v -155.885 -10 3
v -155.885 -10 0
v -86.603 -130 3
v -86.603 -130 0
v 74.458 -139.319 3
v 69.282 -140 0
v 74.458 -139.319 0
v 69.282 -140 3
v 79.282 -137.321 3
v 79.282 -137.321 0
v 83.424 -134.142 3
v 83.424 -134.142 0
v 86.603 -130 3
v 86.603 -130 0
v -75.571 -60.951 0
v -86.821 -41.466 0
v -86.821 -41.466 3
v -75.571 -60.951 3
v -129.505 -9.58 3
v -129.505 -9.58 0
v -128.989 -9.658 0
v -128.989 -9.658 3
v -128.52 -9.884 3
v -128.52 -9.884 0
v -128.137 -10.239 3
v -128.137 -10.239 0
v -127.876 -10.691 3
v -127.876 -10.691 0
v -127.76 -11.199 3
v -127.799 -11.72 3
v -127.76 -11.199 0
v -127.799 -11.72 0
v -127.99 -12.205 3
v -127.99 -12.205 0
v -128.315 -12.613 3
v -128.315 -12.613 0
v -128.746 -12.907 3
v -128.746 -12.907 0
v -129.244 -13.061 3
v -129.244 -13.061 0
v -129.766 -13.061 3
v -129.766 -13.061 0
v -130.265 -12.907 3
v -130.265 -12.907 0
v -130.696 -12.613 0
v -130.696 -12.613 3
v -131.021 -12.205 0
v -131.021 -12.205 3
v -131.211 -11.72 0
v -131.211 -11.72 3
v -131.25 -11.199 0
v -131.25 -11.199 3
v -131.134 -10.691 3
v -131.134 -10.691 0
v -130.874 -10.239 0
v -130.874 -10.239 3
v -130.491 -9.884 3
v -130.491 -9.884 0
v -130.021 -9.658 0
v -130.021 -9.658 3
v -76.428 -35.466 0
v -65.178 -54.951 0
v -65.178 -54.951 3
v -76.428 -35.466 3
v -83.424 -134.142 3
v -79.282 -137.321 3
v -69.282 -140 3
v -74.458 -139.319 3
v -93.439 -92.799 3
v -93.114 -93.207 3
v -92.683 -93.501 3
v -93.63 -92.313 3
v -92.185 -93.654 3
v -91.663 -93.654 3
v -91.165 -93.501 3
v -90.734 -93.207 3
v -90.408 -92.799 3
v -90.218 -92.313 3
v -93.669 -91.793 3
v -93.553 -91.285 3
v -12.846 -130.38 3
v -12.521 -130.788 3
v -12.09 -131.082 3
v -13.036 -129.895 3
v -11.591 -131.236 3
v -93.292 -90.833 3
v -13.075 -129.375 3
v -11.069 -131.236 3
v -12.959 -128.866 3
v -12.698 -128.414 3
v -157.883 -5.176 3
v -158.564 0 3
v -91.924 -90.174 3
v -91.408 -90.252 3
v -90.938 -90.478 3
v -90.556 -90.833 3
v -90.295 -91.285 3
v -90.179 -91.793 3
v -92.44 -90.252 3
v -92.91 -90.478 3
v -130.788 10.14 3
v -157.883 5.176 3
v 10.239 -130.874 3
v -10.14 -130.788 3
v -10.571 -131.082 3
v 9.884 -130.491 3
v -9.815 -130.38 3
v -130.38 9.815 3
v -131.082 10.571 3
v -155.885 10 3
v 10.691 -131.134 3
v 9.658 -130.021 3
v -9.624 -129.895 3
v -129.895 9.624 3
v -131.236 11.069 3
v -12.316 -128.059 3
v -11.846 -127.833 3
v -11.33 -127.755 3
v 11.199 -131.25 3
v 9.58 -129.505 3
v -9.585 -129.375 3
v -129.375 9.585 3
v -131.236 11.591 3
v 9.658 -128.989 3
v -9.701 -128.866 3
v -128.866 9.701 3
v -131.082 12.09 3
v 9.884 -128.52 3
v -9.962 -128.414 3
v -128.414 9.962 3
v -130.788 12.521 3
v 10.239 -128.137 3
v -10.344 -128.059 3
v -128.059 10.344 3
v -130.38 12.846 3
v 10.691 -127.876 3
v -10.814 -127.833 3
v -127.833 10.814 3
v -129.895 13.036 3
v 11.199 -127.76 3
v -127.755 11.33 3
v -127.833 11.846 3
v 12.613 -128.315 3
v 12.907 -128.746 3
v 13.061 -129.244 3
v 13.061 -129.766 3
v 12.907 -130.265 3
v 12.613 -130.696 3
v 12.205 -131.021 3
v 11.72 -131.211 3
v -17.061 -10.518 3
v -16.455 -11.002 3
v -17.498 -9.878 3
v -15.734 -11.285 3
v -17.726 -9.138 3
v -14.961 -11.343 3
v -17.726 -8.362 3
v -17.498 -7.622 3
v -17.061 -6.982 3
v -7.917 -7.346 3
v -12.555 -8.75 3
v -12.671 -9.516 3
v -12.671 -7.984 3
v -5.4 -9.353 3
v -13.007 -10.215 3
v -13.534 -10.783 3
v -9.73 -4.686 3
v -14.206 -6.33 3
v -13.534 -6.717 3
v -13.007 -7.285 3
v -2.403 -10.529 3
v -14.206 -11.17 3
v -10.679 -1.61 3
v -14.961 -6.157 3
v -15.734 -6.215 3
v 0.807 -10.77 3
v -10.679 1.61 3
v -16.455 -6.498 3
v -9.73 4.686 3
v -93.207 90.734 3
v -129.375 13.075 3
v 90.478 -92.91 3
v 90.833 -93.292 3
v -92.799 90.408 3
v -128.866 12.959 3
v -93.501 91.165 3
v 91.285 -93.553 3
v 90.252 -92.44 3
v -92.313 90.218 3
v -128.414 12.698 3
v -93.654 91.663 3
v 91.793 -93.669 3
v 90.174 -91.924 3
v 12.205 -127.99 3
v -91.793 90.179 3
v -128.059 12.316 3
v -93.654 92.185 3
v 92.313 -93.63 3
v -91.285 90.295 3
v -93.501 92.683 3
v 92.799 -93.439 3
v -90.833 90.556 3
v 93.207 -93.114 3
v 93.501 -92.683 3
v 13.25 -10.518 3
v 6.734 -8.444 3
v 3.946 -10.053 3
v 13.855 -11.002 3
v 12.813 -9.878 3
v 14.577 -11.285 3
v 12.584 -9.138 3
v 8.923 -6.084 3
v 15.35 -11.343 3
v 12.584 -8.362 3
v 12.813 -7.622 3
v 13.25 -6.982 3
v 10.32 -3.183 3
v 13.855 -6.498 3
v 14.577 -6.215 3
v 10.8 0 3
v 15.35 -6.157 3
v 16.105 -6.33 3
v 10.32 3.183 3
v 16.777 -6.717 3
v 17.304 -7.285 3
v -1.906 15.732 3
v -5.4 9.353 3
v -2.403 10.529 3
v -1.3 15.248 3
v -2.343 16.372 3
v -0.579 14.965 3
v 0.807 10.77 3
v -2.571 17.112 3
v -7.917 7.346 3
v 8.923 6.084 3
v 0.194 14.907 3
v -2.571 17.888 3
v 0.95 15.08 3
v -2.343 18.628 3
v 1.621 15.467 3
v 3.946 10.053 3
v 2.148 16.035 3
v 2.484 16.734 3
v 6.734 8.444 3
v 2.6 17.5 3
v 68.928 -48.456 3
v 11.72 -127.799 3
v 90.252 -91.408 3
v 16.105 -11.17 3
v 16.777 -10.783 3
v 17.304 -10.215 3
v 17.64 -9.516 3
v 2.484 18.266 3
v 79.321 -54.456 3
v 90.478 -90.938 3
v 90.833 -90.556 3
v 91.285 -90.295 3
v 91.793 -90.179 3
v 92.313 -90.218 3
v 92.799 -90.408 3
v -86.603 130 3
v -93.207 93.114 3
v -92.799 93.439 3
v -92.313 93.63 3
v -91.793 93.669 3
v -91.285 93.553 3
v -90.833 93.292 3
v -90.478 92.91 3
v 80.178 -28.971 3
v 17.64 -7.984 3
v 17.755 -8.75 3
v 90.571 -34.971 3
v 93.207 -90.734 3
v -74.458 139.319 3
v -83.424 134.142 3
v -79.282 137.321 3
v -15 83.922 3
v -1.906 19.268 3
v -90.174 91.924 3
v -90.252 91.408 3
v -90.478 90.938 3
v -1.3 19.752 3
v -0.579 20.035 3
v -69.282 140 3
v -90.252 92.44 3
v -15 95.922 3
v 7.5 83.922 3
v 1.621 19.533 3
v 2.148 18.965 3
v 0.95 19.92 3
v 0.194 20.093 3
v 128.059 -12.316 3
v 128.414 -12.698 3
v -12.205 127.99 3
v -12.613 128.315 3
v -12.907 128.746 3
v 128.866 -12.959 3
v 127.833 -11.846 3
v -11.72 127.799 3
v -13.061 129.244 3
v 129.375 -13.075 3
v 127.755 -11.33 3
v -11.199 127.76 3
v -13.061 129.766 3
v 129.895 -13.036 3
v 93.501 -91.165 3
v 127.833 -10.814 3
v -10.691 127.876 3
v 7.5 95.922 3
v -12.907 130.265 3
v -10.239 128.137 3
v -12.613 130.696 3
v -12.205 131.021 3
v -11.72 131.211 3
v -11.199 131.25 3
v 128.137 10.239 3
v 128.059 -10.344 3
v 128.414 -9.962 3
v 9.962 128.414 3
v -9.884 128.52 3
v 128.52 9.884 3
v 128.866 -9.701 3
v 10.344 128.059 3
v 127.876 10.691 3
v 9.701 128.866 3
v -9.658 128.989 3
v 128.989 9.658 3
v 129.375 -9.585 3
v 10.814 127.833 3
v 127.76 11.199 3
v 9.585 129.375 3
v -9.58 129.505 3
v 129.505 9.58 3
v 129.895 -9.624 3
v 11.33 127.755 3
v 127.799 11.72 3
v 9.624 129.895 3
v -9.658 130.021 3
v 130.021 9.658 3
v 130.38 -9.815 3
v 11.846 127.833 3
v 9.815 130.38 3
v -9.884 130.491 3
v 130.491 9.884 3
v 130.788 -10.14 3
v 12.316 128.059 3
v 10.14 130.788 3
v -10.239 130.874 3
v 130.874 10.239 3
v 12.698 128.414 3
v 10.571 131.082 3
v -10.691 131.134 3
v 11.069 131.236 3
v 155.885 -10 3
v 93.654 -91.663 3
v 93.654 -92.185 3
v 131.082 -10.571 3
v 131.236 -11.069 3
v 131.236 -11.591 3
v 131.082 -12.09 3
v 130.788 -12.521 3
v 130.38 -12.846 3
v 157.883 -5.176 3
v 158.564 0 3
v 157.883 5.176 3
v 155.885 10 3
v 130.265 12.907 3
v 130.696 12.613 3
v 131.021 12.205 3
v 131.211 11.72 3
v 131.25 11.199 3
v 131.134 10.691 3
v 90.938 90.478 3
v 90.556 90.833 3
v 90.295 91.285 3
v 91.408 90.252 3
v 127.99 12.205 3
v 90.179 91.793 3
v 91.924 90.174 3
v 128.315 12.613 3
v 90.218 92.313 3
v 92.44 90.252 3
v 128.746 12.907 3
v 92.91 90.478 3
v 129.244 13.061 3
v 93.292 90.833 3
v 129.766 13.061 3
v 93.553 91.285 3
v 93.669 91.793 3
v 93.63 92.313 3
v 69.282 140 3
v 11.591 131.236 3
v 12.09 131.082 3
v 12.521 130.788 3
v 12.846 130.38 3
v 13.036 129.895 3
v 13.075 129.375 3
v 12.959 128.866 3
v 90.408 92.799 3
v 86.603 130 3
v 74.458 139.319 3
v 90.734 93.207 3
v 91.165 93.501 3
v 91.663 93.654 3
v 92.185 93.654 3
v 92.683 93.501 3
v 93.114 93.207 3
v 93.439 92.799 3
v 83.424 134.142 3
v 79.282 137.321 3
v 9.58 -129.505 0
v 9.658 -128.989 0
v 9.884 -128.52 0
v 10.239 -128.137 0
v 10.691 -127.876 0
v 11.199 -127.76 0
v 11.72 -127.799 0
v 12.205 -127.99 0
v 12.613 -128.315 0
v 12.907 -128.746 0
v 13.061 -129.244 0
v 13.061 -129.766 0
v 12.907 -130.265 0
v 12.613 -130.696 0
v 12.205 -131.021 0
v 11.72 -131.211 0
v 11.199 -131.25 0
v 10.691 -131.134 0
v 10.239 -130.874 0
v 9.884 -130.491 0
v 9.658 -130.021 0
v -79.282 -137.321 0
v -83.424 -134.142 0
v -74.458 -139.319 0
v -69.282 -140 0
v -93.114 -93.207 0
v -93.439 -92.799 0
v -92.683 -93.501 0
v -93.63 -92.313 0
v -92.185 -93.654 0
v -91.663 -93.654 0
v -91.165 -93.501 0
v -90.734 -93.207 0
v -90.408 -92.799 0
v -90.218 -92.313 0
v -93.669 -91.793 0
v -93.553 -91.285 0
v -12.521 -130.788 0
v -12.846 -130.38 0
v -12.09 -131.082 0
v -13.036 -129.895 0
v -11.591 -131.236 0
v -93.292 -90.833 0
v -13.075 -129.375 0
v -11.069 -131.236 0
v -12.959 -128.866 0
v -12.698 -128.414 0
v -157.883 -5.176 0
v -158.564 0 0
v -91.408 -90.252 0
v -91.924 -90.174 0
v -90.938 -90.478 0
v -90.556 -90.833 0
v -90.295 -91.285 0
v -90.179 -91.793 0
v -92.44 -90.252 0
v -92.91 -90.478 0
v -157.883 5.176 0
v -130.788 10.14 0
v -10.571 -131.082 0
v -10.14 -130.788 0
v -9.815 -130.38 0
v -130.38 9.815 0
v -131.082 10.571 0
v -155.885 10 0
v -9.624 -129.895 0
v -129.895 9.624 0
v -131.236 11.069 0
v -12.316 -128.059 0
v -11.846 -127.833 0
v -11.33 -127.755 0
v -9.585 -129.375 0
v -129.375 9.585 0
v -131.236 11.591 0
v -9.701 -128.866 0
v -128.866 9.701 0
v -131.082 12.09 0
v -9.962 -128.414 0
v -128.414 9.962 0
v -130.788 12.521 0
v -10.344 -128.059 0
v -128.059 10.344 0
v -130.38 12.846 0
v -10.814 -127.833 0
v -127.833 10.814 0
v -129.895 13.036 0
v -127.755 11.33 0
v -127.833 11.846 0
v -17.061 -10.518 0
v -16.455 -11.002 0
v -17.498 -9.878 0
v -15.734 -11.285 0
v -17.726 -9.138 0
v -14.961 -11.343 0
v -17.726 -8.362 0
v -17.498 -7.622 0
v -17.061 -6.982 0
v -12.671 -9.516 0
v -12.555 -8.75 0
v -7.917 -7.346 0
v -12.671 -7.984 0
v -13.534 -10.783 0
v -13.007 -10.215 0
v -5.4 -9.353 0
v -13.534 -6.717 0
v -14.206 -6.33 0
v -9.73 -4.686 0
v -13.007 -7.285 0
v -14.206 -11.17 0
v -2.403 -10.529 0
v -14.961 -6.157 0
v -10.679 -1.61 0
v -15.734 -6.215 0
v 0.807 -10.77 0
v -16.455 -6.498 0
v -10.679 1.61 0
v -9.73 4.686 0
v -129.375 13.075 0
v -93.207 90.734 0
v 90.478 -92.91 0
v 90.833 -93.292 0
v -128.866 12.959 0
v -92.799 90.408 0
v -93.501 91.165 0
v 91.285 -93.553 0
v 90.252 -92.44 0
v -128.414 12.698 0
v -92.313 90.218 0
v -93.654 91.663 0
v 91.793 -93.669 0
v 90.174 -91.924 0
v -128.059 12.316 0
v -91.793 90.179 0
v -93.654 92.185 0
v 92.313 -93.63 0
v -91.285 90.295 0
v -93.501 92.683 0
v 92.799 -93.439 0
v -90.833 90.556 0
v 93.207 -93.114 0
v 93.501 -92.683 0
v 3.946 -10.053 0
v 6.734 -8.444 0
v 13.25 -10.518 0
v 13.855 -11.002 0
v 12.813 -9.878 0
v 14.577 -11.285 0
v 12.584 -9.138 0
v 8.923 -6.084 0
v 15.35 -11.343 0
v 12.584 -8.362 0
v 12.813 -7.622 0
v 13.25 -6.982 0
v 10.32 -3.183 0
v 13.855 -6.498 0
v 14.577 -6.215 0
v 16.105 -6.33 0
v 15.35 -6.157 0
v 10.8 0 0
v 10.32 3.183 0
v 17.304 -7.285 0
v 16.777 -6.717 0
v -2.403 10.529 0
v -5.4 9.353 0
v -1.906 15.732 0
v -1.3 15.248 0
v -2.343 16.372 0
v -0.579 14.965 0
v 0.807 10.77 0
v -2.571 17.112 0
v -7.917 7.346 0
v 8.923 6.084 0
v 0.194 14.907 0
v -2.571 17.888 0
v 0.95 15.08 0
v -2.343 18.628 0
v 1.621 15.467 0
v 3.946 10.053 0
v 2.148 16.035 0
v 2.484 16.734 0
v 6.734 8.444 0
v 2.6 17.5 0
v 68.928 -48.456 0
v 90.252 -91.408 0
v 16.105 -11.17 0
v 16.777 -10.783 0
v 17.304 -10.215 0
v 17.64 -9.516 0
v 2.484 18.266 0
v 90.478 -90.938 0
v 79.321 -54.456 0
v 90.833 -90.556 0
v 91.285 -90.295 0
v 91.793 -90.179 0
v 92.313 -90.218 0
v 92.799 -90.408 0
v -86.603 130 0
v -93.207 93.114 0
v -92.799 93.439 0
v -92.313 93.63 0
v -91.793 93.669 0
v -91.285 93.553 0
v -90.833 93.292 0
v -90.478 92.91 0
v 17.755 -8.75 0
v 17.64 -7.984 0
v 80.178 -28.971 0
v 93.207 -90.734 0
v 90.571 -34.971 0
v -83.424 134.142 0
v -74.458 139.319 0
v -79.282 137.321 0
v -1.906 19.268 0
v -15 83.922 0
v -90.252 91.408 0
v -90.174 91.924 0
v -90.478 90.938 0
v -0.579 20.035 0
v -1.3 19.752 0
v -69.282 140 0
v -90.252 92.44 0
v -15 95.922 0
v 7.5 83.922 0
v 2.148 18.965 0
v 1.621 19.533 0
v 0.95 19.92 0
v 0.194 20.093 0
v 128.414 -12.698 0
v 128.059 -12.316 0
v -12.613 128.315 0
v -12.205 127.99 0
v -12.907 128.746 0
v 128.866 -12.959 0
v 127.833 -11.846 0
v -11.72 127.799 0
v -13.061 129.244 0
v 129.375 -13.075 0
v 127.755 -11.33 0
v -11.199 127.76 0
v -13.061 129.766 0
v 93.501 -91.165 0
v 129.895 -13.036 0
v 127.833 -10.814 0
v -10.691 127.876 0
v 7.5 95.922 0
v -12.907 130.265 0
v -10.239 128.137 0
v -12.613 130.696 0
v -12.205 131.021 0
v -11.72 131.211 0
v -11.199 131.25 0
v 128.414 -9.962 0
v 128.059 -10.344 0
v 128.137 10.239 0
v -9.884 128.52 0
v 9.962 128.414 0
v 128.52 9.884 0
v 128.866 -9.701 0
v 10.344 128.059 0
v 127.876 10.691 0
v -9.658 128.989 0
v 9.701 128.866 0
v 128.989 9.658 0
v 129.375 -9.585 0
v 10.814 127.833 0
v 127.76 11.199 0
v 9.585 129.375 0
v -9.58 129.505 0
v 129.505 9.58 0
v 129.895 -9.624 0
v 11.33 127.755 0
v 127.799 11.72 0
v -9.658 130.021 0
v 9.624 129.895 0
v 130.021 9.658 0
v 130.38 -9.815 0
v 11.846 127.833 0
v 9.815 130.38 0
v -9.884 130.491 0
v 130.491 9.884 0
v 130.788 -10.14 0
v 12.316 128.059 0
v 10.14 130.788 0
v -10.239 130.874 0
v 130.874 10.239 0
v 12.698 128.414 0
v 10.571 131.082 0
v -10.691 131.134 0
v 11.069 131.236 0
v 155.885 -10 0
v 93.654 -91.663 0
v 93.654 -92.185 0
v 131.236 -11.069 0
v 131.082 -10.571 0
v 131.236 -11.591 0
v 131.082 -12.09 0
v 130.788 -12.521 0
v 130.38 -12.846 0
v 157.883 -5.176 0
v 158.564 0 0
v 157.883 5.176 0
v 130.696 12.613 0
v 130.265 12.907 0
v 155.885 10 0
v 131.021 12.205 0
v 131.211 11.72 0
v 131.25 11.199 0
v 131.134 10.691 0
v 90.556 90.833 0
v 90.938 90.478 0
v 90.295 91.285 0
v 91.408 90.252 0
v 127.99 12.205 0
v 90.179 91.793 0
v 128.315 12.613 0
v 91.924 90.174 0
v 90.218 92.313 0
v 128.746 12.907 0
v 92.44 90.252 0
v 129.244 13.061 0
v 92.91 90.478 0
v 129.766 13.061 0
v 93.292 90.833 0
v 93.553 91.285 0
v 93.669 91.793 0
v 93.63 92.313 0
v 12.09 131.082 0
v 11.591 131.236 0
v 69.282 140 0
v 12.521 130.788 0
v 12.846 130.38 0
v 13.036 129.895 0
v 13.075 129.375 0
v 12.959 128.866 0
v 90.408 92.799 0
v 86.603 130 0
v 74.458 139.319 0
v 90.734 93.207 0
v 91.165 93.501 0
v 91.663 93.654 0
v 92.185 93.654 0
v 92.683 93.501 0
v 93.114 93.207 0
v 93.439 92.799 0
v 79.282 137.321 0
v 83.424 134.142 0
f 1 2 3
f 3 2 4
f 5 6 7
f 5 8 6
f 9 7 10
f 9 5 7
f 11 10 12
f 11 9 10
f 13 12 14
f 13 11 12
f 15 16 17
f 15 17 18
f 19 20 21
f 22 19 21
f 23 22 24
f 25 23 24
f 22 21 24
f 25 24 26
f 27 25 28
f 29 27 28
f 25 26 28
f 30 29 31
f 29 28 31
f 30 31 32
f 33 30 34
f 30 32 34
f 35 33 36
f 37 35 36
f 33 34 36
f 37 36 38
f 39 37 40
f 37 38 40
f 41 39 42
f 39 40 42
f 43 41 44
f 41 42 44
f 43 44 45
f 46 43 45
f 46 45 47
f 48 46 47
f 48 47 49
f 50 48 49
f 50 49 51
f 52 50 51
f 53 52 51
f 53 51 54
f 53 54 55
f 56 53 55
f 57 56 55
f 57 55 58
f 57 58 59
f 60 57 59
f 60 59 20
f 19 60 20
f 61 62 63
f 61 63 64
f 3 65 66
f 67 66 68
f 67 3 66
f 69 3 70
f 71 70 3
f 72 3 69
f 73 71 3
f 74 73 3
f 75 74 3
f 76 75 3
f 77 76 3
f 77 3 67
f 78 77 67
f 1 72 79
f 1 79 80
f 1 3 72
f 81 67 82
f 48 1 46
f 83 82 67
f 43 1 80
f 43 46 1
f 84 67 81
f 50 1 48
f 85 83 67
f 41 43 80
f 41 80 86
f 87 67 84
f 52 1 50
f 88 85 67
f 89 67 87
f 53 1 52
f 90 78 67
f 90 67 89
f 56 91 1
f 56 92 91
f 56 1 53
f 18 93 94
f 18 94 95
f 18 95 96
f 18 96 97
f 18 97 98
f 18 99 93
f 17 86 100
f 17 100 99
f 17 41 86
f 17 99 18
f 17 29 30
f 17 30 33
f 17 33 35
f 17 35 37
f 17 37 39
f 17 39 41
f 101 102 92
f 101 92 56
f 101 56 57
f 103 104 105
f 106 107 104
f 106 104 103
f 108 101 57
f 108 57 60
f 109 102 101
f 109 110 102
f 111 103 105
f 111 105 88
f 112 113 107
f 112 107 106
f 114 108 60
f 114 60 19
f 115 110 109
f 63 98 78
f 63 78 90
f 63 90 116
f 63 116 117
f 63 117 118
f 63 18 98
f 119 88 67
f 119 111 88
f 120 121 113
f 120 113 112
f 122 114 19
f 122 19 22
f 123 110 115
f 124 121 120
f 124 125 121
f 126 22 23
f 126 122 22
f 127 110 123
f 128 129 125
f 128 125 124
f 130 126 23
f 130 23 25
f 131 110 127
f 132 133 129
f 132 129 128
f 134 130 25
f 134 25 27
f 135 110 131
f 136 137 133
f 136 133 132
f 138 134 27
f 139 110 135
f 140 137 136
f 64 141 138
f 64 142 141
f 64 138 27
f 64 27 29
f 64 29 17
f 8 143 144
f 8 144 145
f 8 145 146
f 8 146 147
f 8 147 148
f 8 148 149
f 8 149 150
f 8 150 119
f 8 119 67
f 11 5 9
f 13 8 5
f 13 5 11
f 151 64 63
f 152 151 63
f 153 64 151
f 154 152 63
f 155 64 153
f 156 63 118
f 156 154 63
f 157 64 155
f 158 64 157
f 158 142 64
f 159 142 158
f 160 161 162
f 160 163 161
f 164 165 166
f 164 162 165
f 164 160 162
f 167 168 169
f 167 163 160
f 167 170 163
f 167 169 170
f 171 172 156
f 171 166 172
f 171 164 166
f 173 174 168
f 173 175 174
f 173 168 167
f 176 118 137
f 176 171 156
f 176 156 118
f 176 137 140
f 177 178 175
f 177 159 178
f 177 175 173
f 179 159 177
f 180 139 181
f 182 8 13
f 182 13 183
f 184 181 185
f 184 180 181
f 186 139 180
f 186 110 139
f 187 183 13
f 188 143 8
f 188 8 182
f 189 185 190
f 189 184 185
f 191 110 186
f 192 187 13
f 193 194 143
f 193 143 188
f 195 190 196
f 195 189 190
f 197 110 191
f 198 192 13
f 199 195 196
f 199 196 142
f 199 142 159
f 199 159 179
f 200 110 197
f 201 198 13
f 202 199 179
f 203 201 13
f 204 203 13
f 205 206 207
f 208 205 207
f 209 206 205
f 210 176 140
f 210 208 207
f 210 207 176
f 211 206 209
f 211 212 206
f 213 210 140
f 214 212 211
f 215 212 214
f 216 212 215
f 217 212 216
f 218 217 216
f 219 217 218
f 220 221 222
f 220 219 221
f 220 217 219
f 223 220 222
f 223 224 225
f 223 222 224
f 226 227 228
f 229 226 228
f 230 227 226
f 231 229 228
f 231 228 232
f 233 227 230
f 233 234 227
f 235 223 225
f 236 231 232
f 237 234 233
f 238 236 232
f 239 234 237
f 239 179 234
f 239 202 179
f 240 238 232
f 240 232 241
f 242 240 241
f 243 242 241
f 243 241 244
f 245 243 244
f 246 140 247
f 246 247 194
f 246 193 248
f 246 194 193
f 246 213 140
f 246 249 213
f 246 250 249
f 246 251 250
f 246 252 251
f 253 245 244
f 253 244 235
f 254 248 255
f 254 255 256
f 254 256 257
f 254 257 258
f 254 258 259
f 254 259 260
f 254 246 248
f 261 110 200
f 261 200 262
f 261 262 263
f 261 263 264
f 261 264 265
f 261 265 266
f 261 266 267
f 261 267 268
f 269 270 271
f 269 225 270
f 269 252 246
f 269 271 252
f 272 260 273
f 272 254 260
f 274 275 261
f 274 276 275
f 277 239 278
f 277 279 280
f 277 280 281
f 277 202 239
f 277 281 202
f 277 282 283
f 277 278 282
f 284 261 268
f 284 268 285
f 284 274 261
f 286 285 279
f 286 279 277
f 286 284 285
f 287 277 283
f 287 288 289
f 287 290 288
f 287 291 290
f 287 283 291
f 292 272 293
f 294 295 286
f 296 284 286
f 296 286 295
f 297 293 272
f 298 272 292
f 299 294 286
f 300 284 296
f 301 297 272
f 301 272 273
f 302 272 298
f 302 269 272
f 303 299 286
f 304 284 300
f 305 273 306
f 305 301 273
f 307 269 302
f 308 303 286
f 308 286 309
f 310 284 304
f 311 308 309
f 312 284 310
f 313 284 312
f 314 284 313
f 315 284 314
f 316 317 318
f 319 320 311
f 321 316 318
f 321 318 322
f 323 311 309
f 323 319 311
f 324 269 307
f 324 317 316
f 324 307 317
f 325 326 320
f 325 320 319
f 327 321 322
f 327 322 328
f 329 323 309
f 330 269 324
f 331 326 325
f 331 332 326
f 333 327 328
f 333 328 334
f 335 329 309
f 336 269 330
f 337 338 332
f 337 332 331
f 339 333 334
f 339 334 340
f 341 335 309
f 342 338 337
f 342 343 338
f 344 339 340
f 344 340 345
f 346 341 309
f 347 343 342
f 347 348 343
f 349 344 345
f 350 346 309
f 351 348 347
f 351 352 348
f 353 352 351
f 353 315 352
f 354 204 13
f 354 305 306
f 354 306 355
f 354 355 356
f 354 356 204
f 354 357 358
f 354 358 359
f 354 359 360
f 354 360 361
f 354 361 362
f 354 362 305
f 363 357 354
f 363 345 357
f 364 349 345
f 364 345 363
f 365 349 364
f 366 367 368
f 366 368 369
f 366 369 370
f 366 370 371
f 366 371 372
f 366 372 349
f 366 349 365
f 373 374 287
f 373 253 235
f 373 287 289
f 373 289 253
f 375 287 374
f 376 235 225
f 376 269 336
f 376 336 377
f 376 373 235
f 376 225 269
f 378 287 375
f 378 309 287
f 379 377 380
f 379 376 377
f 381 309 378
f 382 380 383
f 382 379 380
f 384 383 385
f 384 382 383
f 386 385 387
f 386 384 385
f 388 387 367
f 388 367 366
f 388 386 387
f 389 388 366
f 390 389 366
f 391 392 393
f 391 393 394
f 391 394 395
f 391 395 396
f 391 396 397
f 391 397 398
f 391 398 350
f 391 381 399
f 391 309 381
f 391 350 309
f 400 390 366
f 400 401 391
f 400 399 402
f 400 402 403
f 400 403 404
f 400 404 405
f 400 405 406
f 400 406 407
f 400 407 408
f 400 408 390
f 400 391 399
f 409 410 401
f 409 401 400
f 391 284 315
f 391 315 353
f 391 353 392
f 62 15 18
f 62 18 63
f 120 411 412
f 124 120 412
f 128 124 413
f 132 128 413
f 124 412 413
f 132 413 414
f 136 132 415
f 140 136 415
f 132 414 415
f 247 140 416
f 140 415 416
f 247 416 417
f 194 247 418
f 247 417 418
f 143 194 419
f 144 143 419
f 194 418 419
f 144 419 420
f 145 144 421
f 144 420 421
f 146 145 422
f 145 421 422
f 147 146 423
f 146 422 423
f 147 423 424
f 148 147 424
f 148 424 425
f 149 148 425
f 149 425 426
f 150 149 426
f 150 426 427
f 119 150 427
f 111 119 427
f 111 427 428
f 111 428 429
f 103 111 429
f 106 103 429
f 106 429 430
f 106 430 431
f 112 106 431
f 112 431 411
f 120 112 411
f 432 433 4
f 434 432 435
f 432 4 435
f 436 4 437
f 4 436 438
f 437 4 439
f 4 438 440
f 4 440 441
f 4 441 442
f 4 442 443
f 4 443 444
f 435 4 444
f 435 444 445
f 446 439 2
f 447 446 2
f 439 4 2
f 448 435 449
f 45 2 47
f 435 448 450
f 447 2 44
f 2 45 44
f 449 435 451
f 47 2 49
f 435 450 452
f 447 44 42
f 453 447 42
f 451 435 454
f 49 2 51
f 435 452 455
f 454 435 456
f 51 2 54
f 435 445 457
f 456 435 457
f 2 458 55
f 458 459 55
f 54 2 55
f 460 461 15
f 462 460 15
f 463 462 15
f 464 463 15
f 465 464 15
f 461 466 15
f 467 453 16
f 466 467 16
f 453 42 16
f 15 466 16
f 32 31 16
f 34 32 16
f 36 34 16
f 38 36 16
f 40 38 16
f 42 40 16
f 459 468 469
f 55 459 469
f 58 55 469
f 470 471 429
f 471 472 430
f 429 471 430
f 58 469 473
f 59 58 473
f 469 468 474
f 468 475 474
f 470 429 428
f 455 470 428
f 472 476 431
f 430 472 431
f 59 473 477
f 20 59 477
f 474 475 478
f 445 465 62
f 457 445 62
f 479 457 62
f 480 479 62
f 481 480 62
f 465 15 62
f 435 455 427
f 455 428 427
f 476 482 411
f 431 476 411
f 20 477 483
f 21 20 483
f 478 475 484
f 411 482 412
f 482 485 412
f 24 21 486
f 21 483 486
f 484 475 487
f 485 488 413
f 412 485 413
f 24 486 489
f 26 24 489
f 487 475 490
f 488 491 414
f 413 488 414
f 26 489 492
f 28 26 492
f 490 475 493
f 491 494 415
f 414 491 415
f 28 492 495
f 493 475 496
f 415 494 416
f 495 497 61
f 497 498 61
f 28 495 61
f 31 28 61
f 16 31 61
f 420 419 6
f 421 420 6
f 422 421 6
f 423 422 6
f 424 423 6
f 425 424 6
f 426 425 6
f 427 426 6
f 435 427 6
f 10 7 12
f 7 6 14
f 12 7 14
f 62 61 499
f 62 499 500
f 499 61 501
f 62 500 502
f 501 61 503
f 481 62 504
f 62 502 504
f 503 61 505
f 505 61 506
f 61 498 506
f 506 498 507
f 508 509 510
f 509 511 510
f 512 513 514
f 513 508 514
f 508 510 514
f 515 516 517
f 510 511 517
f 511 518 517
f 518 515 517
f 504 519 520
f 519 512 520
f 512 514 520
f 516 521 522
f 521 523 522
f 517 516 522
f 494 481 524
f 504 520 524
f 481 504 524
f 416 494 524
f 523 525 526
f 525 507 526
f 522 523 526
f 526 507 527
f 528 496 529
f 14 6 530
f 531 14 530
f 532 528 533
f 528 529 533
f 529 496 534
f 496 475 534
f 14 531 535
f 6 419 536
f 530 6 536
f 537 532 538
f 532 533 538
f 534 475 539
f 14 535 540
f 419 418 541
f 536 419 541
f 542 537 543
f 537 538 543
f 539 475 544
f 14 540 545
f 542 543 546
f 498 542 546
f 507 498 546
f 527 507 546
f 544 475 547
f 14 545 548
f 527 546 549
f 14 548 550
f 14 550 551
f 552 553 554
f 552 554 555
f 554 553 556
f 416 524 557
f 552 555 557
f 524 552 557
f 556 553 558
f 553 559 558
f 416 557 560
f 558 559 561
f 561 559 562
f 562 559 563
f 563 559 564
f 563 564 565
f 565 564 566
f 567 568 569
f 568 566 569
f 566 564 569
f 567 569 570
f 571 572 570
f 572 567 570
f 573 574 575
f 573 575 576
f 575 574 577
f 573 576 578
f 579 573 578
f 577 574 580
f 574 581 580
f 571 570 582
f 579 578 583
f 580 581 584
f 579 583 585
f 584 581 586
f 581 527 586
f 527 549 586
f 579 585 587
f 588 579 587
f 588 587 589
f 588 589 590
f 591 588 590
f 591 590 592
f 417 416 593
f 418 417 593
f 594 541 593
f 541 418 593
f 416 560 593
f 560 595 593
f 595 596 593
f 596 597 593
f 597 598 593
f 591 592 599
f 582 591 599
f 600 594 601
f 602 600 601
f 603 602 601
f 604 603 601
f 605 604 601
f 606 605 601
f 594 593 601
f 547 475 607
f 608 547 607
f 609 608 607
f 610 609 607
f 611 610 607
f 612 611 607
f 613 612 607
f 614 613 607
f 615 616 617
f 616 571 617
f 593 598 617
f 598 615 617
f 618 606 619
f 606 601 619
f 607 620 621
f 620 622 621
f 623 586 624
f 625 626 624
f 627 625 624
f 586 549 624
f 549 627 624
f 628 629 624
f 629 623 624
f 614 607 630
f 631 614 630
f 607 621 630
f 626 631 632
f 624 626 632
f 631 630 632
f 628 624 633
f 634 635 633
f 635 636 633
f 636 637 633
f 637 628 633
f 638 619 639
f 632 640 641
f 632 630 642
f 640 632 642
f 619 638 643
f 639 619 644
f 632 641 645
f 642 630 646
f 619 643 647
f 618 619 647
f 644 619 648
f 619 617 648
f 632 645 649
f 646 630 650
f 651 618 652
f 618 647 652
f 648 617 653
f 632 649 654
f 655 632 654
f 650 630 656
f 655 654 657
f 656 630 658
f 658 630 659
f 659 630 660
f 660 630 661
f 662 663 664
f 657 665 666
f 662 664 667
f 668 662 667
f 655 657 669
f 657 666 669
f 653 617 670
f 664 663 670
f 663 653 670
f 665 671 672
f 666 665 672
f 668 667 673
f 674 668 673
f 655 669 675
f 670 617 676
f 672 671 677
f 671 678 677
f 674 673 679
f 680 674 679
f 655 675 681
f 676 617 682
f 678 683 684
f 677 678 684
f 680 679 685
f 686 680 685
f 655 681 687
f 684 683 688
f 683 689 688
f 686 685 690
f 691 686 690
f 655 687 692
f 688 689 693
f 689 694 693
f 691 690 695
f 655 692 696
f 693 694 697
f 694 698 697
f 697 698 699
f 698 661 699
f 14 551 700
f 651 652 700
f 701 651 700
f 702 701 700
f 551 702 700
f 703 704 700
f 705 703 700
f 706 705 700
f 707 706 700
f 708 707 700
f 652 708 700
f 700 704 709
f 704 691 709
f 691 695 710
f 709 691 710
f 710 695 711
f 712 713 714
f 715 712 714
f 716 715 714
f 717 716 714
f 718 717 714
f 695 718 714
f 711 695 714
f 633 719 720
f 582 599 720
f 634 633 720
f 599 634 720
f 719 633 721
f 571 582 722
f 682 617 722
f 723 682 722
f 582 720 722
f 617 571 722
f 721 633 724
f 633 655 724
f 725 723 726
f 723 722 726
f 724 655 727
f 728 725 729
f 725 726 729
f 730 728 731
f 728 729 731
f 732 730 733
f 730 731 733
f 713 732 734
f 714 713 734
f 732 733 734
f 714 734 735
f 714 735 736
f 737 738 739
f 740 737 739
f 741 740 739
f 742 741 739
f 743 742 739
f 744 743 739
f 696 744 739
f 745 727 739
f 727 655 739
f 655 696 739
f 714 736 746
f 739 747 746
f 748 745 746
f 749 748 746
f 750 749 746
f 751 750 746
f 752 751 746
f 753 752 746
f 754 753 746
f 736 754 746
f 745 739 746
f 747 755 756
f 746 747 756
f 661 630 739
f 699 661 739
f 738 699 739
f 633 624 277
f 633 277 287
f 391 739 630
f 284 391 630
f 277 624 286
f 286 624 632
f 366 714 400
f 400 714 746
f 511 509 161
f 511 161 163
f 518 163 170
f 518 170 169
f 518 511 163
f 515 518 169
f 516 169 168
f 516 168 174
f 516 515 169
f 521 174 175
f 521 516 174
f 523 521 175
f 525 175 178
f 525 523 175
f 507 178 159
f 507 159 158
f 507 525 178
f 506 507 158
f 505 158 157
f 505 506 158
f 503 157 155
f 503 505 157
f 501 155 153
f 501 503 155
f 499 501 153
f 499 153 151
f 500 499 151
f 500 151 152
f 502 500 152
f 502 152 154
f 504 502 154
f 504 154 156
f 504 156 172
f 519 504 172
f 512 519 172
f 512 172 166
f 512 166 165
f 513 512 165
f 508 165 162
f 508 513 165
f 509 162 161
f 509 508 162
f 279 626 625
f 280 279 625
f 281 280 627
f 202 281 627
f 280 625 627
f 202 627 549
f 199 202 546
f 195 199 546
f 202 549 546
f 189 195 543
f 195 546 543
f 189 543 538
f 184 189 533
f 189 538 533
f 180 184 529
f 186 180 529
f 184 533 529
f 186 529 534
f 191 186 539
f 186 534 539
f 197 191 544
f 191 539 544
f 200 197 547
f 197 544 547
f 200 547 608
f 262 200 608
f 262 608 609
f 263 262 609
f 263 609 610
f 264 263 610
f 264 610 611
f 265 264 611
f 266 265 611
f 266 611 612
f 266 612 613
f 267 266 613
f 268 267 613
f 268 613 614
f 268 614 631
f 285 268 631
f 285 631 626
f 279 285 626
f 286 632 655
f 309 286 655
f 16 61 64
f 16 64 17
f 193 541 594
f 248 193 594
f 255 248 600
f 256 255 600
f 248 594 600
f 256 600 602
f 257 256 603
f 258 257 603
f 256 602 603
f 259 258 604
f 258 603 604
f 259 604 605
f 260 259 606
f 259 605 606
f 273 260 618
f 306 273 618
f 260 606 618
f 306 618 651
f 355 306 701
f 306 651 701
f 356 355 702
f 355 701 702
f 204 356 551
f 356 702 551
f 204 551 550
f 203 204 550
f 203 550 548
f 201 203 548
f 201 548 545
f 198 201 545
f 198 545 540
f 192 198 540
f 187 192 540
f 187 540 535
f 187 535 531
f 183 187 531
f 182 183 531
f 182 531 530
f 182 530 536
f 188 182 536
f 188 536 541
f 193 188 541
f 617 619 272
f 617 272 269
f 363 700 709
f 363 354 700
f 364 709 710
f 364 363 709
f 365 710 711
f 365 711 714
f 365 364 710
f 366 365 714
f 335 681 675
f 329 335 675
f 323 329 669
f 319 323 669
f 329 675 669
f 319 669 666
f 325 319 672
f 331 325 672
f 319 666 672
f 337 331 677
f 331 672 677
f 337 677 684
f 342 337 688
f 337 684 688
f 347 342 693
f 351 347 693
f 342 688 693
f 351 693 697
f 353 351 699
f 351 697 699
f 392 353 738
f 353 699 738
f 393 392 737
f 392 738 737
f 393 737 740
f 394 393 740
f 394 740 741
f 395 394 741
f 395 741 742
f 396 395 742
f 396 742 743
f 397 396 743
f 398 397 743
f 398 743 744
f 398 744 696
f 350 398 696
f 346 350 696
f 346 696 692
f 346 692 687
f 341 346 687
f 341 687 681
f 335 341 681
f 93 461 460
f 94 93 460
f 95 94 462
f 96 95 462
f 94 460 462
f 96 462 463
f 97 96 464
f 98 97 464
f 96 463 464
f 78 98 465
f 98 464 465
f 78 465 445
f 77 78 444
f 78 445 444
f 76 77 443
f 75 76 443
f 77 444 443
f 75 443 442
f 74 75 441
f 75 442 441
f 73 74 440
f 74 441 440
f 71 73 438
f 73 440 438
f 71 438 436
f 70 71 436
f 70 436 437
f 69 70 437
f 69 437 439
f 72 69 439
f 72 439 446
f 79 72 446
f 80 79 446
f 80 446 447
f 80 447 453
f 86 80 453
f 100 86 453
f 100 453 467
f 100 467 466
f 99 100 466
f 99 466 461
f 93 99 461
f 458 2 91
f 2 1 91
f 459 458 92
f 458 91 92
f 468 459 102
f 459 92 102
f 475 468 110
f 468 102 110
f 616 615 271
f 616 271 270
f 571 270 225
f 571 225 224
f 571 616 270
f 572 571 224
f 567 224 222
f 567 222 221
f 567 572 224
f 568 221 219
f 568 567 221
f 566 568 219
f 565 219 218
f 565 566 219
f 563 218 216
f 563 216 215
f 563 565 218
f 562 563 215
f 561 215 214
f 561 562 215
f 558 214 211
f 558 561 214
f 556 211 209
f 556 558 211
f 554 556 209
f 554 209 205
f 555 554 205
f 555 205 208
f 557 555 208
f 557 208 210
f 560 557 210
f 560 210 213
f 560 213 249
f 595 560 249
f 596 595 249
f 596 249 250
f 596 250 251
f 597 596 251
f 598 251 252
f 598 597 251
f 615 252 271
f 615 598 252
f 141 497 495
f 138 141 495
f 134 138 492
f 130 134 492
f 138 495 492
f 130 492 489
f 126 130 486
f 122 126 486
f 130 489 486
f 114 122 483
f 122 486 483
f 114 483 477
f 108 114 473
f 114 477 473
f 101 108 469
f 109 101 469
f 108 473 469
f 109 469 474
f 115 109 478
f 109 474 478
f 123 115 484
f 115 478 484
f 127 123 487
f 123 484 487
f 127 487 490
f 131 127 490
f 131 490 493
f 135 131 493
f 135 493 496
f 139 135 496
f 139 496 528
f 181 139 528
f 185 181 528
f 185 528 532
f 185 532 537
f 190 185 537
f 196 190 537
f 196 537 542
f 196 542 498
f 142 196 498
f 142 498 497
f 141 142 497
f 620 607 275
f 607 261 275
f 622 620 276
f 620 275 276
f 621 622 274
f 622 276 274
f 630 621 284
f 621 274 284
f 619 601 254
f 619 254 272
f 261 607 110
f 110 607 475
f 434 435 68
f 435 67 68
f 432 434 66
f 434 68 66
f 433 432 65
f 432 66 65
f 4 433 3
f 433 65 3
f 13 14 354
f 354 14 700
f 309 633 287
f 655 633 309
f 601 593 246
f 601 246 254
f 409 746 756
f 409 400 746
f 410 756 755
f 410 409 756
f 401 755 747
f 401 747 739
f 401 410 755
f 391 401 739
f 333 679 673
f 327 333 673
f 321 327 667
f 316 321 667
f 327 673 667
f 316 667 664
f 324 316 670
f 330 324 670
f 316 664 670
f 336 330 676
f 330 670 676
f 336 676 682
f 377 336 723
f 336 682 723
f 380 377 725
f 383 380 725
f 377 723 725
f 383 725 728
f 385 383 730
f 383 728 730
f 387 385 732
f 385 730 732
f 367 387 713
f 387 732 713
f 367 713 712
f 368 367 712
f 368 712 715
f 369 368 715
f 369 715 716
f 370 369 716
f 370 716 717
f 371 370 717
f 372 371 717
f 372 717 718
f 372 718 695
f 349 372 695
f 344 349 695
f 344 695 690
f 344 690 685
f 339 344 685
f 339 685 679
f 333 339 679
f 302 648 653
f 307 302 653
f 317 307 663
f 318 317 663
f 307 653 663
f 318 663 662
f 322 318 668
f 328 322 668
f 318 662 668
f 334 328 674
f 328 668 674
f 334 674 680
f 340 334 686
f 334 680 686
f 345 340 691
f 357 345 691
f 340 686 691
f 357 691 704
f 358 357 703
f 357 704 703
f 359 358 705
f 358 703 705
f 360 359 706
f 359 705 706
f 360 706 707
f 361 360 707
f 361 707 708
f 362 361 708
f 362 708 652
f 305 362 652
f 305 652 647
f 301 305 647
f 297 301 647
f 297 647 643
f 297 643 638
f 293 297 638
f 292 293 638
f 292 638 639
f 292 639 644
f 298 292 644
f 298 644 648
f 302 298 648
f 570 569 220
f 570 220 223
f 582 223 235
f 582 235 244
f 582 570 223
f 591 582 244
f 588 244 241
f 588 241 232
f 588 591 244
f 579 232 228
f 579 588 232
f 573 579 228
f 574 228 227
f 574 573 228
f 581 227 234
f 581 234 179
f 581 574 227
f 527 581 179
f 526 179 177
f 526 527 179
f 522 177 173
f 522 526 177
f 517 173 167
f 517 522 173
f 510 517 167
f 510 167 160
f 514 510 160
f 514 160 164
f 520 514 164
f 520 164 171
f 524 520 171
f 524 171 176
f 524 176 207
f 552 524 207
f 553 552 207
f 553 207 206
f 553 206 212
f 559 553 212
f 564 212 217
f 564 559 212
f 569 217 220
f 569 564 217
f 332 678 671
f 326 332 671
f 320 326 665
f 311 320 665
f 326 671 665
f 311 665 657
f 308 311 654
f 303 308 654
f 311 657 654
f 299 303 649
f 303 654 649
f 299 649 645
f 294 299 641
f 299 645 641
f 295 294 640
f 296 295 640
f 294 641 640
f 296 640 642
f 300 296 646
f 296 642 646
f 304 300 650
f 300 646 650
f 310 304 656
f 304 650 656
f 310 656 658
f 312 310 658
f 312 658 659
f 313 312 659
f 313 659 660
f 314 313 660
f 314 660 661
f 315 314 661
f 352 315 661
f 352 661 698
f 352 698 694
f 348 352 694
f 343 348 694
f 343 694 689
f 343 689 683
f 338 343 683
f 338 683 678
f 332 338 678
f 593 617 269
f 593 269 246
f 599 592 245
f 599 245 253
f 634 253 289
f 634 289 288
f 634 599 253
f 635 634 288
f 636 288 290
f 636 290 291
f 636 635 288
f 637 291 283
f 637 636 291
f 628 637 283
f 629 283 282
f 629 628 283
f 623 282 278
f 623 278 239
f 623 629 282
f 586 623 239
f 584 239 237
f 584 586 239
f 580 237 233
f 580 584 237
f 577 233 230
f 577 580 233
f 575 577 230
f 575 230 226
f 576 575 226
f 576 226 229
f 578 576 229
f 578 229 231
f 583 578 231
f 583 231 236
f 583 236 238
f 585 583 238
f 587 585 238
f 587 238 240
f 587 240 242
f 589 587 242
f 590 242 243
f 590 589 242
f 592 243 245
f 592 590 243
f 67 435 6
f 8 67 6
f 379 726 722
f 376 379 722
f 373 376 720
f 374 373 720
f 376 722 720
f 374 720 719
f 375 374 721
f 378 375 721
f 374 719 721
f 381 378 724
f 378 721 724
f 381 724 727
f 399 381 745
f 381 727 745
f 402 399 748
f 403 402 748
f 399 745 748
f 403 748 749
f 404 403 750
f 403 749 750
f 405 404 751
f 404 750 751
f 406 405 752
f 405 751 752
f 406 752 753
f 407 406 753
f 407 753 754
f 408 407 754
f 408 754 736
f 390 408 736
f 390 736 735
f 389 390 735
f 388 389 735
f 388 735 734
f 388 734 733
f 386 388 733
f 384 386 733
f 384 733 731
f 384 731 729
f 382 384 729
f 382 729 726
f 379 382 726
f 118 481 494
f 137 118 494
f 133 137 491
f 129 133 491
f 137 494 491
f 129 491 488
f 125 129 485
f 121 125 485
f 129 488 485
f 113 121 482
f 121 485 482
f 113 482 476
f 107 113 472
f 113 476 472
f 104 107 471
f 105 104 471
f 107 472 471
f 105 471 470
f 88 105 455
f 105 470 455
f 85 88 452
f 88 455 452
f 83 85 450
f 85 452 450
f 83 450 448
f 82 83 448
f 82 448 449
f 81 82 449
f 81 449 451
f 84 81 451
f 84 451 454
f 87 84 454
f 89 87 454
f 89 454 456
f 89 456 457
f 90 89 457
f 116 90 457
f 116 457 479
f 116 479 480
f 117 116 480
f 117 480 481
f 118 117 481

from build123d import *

# Parameters (mm, degrees)
CROQUIS1_R              = 10.8
CROQUIS1_R_2            = 2.6
CROQUIS1_W              = 22.5
CROQUIS1_H              = 12
SALIENTE_EXTRUIR1_DEPTH = 3
REDONDEO1_R             = 20
CROQUIS3_R              = 1.75
CORTAR_EXTRUIR1_DEPTH   = 212.545651301
MATRIZC1_COUNT          = 4


with BuildPart() as part:
    # Croquis1 → Saliente-Extruir1 (new body)
    with BuildSketch(Plane.XY):
        Polygon((-80.829037687, -140), (80.829037687, -140), (161.658075373, 0), (80.829037687, 140), (-80.829037687, 140), (-161.658075373, 0), align=None)
        Circle(CROQUIS1_R, mode=Mode.SUBTRACT)
        with Locations((0, 17.5)):
            Circle(CROQUIS1_R_2, mode=Mode.SUBTRACT)
        with Locations((15.155444566, -8.75)):
            Circle(CROQUIS1_R_2, mode=Mode.SUBTRACT)
        with Locations((-15.155444566, -8.75)):
            Circle(CROQUIS1_R_2, mode=Mode.SUBTRACT)
        with Locations((-3.75, 89.921841062)):
            Rectangle(CROQUIS1_W, CROQUIS1_H, mode=Mode.SUBTRACT)
        Polygon((90.570751138, -34.970539474), (80.178446292, -28.970539474), (68.928446292, -48.456111059), (79.320751138, -54.456111059), align=None, mode=Mode.SUBTRACT)
        Polygon((-75.570751138, -60.951301588), (-65.178446292, -54.951301588), (-76.428446292, -35.465730003), (-86.820751138, -41.465730003), align=None, mode=Mode.SUBTRACT)
    extrude(amount=SALIENTE_EXTRUIR1_DEPTH)

    # Redondeo1
    redondeo1_edges = [part.edges().sort_by_distance(p)[0] for p in [
        (161.658075373, 0, 1.5),
        (80.829037687, -140, 1.5),
        (-80.829037687, -140, 1.5),
        (-161.658075373, 0, 1.5),
        (-80.829037687, 140, 1.5),
        (80.829037687, 140, 1.5),
    ]]
    fillet(redondeo1_edges, radius=REDONDEO1_R)

    # Croquis3 → Cortar-Extruir1 (cut, through all)
    with BuildSketch(Plane(origin=(0, 0, 0), x_dir=(1, 0, 0), z_dir=(0, 0, -1))):
        with Locations(Location((129.505310752, 11.330246557, 0), (0, 0, 180))):
            Circle(CROQUIS3_R)
        with Locations(Location((91.923881554, 91.923881554, 0), (0, 0, 180))):
            Circle(CROQUIS3_R)
        with Locations(Location((11.330246557, 129.505310752, 0), (0, 0, 180))):
            Circle(CROQUIS3_R)
    cortar_extruir1 = extrude(amount=-CORTAR_EXTRUIR1_DEPTH, mode=Mode.SUBTRACT)

    # MatrizC1: Cortar-Extruir1 ×4 about axis
    matrizc1_axis = Axis((0, 0, 0), (0, 0, 1))
    for i in range(1, MATRIZC1_COUNT):
        add(cortar_extruir1.rotate(matrizc1_axis, i * 360 / MATRIZC1_COUNT), mode=Mode.SUBTRACT)


solid = part.part
